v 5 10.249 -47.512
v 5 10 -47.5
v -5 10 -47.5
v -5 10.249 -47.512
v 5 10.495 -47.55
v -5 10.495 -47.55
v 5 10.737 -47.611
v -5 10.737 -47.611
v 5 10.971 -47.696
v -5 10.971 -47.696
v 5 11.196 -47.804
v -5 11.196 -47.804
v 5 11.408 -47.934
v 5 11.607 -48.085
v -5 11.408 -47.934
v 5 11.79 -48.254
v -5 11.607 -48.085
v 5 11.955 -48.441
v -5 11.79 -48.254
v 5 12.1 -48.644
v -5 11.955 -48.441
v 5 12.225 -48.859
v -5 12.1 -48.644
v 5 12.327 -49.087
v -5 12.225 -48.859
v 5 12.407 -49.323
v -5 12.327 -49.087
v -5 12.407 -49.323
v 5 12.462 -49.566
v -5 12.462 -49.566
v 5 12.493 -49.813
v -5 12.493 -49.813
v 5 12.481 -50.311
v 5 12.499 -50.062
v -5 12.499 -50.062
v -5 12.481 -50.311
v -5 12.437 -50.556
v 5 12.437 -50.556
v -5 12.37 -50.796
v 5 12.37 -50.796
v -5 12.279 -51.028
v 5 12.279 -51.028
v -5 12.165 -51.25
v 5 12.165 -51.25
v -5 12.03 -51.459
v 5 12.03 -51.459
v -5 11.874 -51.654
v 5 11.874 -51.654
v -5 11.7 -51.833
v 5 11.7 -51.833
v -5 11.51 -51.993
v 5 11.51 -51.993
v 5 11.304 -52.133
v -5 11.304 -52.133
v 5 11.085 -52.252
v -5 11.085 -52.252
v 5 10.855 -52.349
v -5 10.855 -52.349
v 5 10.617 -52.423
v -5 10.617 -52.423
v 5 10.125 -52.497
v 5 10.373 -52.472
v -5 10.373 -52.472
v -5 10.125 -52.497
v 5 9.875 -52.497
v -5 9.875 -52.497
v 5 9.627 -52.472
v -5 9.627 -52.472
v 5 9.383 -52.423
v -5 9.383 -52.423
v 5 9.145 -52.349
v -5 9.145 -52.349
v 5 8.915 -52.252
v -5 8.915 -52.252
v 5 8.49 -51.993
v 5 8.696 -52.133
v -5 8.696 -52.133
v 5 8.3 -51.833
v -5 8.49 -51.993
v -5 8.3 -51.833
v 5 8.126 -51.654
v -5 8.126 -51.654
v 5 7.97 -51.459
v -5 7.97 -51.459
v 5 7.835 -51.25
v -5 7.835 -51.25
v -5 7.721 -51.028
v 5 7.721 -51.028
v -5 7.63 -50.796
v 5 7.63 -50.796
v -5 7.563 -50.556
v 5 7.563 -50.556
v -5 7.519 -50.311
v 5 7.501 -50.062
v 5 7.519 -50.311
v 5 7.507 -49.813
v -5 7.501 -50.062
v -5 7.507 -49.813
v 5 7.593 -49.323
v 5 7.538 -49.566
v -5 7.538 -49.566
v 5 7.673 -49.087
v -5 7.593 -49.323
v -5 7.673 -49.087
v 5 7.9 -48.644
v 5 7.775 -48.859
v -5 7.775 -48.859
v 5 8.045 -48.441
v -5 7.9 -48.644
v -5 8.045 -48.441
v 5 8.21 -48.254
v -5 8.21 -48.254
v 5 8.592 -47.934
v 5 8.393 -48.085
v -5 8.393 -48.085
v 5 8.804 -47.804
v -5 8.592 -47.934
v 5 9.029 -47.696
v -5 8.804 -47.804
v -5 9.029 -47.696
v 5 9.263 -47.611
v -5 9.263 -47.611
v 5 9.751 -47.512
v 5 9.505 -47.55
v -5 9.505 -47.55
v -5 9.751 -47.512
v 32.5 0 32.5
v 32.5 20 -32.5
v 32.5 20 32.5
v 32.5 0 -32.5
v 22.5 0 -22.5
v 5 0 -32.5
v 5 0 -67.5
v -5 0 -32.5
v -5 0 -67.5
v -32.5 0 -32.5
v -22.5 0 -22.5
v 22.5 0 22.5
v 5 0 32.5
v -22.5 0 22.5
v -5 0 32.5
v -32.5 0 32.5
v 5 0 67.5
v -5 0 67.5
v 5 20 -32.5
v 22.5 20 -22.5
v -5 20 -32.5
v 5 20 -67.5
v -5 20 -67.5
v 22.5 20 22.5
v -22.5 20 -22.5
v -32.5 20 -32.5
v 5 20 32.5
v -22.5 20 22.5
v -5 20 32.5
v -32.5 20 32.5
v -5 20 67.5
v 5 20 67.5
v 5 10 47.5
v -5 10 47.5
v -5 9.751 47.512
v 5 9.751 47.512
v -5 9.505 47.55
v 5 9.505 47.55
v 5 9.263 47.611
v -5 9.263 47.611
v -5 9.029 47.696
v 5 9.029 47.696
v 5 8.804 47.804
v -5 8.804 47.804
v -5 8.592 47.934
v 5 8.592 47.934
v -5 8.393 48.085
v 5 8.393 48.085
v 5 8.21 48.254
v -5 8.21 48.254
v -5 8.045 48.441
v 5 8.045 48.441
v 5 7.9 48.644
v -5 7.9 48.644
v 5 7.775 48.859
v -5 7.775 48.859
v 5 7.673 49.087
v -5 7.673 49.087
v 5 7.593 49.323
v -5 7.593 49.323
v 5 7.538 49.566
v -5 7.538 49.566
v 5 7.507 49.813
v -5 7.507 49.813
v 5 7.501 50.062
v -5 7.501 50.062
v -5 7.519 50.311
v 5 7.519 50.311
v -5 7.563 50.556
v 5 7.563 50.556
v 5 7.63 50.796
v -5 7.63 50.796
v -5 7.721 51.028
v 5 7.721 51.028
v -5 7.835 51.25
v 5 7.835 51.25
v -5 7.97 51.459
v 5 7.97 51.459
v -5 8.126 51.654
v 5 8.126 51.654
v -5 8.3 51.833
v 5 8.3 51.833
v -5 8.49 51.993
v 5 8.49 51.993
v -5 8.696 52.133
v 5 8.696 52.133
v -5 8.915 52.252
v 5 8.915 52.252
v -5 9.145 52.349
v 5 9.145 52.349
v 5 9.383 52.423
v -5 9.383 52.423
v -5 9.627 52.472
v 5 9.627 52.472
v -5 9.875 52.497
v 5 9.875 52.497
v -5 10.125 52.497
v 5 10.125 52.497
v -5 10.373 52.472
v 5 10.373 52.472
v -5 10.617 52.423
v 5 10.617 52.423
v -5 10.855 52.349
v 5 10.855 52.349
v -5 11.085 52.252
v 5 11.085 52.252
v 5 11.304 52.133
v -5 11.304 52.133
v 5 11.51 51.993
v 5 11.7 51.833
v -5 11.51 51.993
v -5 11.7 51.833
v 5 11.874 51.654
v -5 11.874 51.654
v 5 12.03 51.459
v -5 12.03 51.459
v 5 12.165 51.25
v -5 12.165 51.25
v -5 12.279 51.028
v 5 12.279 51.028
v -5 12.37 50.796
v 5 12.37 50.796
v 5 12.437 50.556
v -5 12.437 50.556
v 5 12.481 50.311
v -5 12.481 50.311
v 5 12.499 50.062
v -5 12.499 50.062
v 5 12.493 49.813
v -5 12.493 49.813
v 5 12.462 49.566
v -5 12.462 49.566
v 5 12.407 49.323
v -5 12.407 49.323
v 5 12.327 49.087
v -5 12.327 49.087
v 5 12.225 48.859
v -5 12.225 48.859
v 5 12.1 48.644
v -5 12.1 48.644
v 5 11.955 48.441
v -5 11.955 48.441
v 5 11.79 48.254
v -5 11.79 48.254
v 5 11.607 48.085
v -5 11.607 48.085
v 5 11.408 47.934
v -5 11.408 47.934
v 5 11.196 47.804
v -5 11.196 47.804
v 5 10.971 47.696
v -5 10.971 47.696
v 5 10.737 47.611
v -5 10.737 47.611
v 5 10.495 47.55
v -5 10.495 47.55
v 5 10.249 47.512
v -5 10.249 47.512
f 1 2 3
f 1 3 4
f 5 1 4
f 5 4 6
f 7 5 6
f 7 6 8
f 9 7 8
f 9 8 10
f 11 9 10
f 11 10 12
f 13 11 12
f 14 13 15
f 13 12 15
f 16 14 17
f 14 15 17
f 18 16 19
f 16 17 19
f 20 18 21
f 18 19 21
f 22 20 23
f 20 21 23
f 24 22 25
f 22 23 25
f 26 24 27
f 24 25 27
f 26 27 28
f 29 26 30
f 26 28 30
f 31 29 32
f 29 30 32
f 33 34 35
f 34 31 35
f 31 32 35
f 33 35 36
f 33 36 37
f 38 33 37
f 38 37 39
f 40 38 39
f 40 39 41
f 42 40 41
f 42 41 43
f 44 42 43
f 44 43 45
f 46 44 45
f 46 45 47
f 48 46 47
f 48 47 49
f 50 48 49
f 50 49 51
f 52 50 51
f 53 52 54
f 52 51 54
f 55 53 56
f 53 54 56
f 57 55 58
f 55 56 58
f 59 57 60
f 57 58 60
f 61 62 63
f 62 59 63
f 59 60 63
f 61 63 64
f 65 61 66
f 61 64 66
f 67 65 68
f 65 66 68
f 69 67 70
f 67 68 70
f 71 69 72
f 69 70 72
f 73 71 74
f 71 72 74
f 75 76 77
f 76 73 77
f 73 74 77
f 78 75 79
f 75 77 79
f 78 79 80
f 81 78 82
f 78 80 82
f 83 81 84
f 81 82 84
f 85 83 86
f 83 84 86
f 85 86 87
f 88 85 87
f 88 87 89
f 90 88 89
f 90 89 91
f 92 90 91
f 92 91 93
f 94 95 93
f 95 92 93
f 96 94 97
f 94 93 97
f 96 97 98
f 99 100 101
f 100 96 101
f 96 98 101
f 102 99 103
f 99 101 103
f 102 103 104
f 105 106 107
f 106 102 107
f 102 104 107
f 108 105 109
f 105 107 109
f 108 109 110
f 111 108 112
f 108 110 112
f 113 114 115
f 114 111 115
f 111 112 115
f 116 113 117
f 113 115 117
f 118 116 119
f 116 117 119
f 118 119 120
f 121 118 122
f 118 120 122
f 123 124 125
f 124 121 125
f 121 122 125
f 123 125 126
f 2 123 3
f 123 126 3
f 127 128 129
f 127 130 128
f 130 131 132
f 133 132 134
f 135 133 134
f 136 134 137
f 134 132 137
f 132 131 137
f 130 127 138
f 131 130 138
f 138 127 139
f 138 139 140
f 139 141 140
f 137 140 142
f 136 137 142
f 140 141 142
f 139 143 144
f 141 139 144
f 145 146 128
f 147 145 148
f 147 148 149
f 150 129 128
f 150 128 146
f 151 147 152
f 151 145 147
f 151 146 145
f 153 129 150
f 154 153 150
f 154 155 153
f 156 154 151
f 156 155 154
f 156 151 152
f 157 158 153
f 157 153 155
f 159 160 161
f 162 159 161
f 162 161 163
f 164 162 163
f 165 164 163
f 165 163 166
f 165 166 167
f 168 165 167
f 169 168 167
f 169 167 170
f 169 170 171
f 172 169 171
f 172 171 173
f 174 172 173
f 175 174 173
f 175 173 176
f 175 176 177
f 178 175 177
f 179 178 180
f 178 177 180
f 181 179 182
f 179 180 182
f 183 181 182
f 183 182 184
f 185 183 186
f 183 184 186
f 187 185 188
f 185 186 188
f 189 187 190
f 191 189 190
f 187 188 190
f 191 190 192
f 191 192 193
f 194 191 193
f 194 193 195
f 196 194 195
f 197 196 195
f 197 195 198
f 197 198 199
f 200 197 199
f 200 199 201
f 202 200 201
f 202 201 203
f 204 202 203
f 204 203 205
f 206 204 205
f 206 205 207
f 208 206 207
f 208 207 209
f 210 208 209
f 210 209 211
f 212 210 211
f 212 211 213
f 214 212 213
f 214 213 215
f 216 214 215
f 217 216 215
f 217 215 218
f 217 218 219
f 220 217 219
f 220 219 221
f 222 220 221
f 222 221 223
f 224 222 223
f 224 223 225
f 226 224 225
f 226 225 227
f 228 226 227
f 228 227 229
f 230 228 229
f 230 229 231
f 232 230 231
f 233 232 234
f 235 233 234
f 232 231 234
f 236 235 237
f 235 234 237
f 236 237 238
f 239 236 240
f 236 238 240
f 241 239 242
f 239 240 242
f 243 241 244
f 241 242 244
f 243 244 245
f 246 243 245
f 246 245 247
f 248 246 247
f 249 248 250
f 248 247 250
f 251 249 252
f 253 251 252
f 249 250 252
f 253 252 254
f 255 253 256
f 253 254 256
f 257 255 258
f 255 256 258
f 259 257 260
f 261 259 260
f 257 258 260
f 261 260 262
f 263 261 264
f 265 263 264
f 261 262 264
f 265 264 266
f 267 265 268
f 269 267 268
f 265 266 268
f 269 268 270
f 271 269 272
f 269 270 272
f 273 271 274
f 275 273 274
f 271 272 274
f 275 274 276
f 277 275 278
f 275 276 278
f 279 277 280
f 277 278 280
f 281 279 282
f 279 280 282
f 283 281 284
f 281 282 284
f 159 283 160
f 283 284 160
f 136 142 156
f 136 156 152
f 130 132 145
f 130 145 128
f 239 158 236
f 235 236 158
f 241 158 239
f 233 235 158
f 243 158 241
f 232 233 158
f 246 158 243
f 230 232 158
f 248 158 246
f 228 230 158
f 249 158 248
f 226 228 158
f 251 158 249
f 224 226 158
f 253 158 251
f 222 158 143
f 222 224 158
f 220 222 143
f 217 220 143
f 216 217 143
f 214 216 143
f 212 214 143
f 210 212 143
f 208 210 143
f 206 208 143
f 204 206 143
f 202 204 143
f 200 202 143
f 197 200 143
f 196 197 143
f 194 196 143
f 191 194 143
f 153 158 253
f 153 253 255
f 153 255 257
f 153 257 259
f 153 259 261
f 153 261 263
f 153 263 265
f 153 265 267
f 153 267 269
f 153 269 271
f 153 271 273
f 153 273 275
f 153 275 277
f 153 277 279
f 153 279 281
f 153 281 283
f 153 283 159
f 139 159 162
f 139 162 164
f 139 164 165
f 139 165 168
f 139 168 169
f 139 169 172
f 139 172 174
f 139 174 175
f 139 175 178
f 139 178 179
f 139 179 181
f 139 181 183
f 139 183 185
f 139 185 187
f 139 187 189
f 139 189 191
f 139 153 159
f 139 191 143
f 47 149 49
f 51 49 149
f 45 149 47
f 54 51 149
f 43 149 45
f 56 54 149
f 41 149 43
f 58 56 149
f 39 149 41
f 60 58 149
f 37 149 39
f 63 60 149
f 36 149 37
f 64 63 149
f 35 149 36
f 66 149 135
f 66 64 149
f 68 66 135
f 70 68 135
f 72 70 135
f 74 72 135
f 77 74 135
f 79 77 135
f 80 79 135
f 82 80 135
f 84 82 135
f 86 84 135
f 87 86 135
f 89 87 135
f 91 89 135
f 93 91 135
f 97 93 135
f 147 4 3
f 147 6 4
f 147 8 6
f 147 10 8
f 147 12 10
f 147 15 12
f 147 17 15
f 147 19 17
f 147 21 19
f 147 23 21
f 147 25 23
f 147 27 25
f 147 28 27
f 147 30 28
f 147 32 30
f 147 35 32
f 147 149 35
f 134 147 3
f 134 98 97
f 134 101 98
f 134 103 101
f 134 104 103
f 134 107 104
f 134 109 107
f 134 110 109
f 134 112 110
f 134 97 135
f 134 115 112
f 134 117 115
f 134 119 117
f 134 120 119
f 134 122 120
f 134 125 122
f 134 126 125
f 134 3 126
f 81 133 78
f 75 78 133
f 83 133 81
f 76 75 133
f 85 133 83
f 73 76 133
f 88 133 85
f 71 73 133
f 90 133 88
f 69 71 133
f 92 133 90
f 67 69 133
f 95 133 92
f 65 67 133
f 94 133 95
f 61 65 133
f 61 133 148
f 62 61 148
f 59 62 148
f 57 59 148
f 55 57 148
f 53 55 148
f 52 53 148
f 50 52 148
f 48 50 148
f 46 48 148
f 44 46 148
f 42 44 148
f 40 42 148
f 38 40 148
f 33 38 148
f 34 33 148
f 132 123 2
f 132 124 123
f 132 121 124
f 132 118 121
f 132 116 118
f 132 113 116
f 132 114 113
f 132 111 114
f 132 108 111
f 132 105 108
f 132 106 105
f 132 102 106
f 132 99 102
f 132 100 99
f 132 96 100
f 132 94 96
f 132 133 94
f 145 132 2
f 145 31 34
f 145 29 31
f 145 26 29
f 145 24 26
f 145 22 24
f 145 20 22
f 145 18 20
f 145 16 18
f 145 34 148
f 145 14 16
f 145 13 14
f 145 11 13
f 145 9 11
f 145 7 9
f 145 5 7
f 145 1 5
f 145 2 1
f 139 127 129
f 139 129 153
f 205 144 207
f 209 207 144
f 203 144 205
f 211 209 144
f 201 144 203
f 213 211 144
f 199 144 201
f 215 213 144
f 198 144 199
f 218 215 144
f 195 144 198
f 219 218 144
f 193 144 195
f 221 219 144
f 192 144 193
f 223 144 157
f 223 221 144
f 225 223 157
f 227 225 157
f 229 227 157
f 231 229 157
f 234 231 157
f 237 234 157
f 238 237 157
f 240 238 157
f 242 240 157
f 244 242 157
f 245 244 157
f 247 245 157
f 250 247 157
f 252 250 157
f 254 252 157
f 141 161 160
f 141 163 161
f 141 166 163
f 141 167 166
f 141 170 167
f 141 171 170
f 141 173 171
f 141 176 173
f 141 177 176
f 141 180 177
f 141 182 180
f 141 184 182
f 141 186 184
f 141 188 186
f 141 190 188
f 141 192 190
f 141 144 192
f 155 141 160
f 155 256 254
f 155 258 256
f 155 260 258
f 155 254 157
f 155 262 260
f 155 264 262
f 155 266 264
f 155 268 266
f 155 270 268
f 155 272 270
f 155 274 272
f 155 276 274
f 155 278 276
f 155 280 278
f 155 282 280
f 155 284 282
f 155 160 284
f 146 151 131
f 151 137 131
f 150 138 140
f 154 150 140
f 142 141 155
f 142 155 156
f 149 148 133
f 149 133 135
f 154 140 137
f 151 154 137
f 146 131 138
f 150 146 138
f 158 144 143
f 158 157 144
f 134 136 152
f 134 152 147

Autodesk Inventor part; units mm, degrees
ref_plane "YZ Plane" through (0, 0, 0) normal (1, 0, 0) x (0, 1, 0)
ref_plane "XZ Plane" through (0, 0, 0) normal (0, 1, 0) x (-1, 0, 0)
ref_plane "XY Plane" through (0, 0, 0) normal (0, 0, 1) x (1, 0, 0)
sketch "Esquisse1" plane through (0, 0, 0) normal (0, 1, 0) x (-1, 0, 0)
  line L0 (-22.5, 22.5) -> (22.5, 22.5)
  line L1 (22.5, 22.5) -> (22.5, -22.5)
  line L2 (22.5, -22.5) -> (-22.5, -22.5)
  line L3 (-22.5, -22.5) -> (-22.5, 22.5)
  line L4 (-22.5, 22.5) -> (22.5, -22.5) construction
  line L5 (22.5, 22.5) -> (-22.5, -22.5) construction
  line L6 (-32.5, 32.5) -> (32.5, 32.5)
  line L7 (32.5, 32.5) -> (32.5, -32.5)
  line L8 (32.5, -32.5) -> (-32.5, -32.5)
  line L9 (-32.5, -32.5) -> (-32.5, 32.5)
  line L10 (-32.5, 32.5) -> (32.5, -32.5) construction
  line L11 (32.5, 32.5) -> (-32.5, -32.5) construction
  point P0 (0, 0)
  dimension "d0" = 45
  dimension "d1" = 45
  dimension "d2" = 65
extrude "Extrusion1" add sketch "Esquisse1" along normal blind 20
sketch "Esquisse2" plane through (-32.5, 0, 32.5) normal (0, 0, 1) x (1, 0, 0)
  line L0 (10, 20) -> (55, 20) projected
  line L1 (37.5, 0) -> (27.5, 0)
  line L2 (27.5, 0) -> (27.5, 20)
  line L3 (27.5, 20) -> (37.5, 20)
  line L4 (37.5, 20) -> (37.5, 0)
  line L5 (37.5, 0) -> (27.5, 20) construction
  line L6 (27.5, 0) -> (37.5, 20) construction
  point P0 (32.5, 0)
  dimension "d6" = 10
extrude "Extrusion2" add sketch "Esquisse2" along normal blind 35
sketch "Esquisse3" plane through (5, 0, 32.5) normal (1, 0, 0) x (0, 0, -1)
  line L0 (-35, 0) -> (-35, 20) projected
  line L1 (0, 0) -> (0, 20) projected
  point P0 (32.5, 0)
  point P1 (-17.5, 10)
hole "Perçage1" at (5, 10, 50) direction (-1, 0, 0) diameter 5 end through all
mirror "Symétrie1" about plane through (0, 0, 0) normal (0, 0, 1) of "Extrusion2", "Perçage1"
ref_plane "Plan de construction1" through (0, 0, 0) normal (0, 0, 1) x (1, 0, 0)
properties part number "Support moteur pas a pas"
